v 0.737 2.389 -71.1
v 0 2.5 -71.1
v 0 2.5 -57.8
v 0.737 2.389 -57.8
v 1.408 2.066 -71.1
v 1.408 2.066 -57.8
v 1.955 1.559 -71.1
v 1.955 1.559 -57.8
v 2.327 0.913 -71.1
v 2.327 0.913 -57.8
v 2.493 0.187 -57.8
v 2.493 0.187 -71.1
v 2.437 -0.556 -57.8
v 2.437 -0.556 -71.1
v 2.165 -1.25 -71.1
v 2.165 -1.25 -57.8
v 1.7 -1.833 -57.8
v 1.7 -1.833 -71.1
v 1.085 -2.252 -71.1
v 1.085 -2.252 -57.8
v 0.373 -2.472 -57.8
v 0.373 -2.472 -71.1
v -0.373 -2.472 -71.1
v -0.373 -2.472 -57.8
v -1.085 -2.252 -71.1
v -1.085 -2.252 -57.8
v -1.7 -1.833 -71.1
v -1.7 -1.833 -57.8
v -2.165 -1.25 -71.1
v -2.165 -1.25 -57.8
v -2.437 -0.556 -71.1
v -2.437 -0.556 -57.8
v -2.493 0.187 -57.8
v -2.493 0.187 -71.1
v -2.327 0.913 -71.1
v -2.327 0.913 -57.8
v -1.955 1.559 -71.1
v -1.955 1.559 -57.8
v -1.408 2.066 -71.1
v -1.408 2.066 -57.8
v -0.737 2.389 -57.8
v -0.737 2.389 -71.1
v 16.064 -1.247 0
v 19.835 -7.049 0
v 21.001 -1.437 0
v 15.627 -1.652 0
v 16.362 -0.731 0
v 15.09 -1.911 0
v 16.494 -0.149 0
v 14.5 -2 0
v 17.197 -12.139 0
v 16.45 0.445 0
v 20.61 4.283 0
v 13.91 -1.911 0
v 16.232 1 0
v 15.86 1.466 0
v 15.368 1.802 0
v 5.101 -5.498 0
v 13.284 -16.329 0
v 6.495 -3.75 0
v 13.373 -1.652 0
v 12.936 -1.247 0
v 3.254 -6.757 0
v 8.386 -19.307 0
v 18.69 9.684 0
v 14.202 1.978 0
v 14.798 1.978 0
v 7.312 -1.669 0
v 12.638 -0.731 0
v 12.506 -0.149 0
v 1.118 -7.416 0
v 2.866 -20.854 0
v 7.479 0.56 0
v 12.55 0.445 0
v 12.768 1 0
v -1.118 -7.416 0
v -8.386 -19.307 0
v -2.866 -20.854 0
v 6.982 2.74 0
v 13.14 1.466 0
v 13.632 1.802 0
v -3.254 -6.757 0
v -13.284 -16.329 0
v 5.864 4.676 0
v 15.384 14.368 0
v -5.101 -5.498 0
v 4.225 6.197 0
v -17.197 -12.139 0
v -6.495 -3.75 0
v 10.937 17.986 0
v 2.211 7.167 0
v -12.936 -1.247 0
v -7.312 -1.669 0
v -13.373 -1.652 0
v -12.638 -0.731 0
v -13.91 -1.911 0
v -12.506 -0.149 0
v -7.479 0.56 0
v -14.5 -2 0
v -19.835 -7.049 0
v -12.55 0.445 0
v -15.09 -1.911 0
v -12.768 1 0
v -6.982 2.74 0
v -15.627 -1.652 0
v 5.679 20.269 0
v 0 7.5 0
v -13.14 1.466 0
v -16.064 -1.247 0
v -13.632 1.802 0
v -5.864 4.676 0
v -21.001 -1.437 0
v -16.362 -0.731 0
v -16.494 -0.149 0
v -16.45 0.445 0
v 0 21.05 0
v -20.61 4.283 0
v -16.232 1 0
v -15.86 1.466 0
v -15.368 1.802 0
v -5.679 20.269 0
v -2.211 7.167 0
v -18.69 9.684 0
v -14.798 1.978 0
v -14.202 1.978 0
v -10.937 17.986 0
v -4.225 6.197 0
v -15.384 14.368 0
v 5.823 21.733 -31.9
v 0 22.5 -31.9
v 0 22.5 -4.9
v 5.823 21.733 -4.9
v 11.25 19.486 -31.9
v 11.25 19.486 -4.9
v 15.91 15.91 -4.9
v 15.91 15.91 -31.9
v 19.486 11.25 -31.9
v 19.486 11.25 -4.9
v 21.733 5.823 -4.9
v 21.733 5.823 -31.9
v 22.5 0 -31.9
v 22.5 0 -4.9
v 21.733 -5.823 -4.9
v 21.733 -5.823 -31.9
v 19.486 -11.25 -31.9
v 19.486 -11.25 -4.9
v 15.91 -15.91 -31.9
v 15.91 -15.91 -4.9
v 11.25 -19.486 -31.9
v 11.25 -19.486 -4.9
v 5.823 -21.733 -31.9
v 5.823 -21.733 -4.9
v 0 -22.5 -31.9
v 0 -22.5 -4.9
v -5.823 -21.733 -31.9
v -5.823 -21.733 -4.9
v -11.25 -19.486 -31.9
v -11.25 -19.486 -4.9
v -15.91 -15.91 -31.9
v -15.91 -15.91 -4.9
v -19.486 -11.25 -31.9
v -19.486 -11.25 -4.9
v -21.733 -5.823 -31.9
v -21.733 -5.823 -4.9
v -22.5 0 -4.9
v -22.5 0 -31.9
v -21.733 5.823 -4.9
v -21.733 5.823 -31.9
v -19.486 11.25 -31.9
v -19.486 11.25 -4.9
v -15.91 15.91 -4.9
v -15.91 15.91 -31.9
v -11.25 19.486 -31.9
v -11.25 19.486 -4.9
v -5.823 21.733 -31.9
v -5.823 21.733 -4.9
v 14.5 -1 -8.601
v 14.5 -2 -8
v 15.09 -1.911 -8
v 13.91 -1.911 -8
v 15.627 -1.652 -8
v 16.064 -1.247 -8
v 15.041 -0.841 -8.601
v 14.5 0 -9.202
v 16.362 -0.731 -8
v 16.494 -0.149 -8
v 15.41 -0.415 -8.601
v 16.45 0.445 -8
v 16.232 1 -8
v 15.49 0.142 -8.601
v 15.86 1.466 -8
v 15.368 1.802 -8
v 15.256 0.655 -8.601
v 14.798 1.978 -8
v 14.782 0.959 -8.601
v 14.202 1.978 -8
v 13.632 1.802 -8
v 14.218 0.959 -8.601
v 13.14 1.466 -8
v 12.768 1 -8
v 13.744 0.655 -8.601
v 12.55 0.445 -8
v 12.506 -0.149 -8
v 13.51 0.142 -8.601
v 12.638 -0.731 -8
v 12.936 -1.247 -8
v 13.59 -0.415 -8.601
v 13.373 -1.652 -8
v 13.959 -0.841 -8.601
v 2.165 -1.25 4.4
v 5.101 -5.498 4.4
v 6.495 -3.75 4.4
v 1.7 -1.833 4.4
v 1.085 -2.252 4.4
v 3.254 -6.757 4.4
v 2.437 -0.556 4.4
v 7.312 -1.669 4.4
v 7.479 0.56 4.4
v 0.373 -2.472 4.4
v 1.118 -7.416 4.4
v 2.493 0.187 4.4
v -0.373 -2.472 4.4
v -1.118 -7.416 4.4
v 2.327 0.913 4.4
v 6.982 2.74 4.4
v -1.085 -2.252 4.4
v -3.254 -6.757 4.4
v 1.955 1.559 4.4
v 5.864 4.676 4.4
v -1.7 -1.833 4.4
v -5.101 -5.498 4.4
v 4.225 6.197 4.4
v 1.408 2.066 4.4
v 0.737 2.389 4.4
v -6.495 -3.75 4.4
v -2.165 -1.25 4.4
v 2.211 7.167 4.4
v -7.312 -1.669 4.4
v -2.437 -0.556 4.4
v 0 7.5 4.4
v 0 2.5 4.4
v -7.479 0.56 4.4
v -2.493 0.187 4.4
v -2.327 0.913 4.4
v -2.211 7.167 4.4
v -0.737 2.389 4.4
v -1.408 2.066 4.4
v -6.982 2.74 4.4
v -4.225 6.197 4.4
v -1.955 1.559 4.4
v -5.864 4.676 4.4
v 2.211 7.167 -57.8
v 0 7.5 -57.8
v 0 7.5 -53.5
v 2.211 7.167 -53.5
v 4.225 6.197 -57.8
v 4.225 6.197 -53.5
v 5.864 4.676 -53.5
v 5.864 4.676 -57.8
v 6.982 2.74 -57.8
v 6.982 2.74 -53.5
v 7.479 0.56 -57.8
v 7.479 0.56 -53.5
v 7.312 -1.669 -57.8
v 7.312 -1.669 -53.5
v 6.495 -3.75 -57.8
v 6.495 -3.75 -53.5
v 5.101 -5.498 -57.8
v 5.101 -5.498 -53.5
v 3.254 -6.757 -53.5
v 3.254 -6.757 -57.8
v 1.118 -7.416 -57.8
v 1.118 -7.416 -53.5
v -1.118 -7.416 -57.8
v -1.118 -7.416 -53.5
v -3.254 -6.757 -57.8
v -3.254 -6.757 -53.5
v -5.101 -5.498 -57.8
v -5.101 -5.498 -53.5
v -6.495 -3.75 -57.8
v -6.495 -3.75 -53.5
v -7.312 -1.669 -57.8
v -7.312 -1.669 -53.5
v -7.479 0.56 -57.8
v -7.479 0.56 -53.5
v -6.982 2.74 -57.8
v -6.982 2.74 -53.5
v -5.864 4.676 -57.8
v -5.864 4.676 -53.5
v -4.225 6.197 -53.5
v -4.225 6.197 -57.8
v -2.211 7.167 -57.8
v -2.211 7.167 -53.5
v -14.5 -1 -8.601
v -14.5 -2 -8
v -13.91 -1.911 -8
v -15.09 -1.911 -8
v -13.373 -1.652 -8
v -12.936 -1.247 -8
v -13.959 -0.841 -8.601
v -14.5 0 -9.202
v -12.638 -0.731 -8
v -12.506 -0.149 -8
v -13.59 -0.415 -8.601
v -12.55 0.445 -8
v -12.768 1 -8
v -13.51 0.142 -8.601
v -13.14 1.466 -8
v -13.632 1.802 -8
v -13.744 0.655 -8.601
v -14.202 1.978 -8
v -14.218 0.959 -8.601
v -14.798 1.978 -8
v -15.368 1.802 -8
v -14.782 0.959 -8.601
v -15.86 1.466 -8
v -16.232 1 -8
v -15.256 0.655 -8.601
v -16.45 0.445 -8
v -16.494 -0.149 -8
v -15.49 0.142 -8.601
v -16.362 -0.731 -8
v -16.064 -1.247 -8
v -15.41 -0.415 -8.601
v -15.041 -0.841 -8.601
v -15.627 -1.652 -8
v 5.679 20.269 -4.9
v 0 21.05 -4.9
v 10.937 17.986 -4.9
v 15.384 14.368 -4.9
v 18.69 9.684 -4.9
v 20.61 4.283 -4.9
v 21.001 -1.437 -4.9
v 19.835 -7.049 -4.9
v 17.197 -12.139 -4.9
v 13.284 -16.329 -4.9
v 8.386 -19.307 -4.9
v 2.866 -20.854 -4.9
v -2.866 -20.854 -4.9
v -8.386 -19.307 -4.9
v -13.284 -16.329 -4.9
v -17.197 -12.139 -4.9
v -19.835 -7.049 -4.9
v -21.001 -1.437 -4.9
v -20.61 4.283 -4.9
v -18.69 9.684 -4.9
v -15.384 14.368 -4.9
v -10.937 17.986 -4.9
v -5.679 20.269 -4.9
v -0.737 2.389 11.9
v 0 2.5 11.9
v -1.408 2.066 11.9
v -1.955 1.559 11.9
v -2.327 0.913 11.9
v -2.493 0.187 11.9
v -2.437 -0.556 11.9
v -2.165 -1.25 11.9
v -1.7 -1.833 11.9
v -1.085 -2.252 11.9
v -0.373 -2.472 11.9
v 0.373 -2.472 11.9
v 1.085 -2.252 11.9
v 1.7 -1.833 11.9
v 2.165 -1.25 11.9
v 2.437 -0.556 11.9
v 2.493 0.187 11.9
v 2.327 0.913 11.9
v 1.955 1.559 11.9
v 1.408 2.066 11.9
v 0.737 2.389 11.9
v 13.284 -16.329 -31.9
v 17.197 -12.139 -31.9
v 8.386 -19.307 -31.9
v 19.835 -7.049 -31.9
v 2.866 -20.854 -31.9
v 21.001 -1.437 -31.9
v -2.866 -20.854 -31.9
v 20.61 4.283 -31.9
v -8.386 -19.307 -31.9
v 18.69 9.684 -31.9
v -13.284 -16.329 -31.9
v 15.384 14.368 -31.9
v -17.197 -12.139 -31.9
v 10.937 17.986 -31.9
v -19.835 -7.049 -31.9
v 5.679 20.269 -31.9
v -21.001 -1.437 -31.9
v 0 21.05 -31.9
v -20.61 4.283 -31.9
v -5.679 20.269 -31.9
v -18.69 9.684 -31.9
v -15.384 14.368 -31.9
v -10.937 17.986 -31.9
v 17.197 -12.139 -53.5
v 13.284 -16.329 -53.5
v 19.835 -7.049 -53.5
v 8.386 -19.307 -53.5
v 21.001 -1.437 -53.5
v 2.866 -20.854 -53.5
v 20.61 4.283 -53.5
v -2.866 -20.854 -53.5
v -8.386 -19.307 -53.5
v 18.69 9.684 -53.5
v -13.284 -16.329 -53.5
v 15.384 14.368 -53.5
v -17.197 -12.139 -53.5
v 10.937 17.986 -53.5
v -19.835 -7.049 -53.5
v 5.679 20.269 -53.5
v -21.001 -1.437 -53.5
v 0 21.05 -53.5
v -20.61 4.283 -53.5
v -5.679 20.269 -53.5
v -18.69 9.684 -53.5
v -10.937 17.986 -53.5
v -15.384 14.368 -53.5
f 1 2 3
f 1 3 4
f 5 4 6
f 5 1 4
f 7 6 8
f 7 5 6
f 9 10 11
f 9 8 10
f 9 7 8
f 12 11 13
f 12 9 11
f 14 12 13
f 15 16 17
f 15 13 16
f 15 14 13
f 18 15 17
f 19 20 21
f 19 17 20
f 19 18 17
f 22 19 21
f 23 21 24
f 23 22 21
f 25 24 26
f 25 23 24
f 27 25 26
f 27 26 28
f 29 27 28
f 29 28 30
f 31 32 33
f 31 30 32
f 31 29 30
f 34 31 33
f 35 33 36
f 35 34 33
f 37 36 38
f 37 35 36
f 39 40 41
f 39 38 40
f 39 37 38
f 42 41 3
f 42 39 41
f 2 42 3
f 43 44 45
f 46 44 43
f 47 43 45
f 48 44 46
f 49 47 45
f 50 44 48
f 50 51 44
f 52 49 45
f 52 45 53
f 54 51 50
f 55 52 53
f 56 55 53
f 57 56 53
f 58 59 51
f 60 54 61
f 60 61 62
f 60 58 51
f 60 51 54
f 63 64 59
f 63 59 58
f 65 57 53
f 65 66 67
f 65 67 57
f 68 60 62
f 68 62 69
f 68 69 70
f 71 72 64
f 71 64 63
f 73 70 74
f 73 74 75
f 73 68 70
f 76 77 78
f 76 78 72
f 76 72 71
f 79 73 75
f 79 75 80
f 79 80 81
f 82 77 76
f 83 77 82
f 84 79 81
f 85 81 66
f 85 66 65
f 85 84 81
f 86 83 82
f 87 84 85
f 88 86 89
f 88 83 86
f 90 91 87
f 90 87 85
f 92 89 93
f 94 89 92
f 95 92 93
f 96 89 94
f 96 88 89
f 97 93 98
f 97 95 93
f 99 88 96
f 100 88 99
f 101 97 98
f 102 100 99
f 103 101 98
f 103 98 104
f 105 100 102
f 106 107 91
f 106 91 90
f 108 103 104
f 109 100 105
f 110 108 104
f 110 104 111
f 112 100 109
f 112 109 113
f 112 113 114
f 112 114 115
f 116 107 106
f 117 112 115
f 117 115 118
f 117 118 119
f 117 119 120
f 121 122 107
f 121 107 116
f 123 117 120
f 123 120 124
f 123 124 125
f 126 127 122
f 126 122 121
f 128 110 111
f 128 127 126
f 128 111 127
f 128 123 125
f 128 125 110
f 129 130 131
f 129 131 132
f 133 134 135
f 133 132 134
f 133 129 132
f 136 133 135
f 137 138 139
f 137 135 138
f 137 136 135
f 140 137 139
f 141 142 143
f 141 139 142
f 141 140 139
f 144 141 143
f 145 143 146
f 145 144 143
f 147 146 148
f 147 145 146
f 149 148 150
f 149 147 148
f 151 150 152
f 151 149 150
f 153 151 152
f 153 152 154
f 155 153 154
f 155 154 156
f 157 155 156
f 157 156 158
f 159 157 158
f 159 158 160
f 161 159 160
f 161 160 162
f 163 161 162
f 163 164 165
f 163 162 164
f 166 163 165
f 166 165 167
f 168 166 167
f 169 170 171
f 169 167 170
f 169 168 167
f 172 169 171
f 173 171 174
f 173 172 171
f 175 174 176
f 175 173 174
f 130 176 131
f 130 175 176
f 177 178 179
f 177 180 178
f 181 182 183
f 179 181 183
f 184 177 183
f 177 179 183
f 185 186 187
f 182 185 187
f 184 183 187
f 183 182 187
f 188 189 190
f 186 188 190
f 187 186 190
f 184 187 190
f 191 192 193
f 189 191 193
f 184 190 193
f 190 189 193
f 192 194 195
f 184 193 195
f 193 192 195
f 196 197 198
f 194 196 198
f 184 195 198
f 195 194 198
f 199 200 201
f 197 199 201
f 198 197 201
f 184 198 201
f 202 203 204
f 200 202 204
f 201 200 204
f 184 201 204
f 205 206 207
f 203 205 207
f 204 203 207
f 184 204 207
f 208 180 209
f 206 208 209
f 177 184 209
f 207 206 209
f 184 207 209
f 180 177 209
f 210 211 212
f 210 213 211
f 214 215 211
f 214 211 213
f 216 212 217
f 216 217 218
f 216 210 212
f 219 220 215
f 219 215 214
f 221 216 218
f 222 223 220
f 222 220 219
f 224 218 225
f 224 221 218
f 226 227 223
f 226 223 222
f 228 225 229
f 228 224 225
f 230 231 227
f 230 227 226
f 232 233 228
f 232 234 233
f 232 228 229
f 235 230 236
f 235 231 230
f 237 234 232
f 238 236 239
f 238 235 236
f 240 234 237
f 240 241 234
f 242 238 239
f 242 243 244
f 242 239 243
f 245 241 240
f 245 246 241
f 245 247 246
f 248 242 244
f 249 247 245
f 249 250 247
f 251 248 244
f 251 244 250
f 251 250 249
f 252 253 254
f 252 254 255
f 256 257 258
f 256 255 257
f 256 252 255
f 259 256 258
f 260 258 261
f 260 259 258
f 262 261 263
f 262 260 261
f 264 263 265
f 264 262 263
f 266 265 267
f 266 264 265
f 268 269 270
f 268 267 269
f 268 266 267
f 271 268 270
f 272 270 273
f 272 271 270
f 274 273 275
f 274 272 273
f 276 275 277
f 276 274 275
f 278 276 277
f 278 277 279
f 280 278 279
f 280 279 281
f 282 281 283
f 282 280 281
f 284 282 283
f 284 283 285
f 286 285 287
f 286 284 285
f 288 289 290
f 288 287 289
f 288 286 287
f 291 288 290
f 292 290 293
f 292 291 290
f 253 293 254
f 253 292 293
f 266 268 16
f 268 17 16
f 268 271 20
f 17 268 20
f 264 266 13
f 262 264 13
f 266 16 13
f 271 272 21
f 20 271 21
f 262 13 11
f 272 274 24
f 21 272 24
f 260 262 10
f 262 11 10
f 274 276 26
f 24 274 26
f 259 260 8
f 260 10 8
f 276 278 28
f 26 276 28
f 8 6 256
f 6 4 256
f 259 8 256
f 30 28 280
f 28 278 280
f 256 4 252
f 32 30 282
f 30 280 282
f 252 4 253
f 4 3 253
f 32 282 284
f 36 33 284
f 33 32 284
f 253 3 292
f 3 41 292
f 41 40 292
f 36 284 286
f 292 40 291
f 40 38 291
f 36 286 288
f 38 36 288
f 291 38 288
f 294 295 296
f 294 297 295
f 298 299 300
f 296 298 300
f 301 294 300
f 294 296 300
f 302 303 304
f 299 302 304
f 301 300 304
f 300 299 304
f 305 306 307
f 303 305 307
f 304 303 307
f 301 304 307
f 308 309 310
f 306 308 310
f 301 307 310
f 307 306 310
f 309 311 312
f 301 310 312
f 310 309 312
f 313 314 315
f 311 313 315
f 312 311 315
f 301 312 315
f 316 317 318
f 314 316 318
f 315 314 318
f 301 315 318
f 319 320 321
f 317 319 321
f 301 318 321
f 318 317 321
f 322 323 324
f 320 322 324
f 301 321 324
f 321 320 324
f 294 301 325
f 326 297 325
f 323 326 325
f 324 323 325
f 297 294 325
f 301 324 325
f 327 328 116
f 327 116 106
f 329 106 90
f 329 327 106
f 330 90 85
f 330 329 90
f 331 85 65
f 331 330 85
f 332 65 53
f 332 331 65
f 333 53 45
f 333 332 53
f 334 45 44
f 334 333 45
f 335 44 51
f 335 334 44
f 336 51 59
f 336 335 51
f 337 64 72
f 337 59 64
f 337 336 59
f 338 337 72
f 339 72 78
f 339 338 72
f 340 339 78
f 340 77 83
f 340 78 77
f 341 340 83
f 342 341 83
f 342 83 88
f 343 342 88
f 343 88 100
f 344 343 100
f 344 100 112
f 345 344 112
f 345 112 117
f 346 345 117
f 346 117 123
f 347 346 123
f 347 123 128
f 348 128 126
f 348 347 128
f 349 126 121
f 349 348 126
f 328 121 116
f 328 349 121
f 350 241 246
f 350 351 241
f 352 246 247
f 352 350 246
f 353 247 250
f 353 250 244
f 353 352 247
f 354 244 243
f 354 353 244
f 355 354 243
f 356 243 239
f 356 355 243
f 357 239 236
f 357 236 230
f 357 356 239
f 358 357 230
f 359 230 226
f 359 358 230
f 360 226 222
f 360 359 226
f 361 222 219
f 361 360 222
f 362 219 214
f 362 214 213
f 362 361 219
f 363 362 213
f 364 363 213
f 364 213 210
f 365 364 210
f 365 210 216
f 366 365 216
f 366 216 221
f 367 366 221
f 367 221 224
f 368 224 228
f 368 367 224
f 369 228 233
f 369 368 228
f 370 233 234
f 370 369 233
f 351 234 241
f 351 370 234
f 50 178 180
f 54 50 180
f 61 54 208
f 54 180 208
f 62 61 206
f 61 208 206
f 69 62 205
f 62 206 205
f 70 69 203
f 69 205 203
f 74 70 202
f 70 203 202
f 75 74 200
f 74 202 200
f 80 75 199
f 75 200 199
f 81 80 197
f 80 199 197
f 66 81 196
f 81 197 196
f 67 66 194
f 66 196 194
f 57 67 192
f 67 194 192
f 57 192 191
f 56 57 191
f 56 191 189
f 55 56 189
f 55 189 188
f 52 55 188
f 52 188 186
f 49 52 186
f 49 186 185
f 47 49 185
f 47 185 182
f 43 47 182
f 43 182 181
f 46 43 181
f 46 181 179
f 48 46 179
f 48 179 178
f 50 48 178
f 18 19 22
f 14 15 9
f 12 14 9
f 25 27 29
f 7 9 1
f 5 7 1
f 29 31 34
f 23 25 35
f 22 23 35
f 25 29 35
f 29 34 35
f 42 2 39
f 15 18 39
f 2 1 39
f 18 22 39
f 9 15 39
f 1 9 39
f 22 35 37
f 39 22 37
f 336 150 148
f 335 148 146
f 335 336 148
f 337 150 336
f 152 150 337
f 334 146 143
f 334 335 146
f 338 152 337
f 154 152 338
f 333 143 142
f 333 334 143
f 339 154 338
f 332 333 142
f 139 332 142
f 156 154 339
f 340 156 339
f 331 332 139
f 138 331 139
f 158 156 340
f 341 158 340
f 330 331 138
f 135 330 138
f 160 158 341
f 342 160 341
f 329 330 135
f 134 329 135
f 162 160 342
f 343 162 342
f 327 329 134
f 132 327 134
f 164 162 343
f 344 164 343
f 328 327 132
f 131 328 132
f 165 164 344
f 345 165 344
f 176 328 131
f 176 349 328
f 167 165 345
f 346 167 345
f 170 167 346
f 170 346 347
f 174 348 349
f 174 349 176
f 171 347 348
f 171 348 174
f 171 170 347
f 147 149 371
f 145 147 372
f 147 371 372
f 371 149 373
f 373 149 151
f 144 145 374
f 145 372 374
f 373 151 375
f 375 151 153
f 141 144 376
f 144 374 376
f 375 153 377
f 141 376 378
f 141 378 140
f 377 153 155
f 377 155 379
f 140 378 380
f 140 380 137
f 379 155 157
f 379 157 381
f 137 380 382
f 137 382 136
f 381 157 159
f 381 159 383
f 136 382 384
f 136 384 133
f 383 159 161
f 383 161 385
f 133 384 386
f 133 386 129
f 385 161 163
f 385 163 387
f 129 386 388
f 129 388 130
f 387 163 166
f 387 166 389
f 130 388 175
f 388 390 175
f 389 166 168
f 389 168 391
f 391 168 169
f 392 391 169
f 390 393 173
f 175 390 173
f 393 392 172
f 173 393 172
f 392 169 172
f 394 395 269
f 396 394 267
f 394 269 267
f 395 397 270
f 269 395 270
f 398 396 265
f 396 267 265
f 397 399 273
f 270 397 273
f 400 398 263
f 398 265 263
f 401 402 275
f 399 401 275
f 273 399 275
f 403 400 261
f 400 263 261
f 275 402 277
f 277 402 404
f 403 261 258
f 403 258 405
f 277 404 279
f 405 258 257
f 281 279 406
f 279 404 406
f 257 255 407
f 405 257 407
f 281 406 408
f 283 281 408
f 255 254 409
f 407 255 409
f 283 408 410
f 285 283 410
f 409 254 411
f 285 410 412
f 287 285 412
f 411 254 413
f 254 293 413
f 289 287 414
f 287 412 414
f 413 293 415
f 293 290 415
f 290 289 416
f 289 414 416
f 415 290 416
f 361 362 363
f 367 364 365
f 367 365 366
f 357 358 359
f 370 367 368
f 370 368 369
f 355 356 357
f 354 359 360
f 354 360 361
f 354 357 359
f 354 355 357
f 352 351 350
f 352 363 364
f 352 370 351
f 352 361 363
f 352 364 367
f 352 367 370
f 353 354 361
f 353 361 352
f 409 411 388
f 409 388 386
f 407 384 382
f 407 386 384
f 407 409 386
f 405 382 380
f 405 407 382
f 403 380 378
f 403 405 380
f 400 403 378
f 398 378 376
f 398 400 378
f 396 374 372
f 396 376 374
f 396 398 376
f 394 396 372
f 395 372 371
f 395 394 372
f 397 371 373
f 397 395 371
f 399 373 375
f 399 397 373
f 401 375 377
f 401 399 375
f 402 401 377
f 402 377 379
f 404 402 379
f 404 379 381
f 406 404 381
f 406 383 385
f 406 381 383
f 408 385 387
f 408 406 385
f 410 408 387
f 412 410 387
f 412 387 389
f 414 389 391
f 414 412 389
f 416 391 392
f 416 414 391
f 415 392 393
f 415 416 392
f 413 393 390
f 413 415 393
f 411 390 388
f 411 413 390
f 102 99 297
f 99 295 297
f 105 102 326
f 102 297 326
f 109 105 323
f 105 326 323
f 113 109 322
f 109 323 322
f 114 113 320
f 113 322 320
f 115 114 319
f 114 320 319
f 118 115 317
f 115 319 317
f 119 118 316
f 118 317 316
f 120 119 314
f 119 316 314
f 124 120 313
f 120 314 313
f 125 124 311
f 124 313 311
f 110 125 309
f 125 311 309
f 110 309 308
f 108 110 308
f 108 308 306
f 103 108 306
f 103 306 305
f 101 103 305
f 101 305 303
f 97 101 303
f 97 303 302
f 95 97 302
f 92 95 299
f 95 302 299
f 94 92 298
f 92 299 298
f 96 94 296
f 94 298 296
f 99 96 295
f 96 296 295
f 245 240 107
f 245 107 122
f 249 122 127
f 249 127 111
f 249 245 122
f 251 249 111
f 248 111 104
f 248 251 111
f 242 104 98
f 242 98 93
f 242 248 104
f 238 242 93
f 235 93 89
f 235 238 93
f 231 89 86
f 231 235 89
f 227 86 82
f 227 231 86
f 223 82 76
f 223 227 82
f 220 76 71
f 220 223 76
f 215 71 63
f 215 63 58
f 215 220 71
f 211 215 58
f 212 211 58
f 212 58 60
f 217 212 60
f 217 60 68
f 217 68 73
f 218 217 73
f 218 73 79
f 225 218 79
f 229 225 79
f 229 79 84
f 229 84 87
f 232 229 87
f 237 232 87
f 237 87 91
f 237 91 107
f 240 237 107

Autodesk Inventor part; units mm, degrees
ref_plane "YZ Plane" through (0, 0, 0) normal (1, 0, 0) x (0, 1, 0)
ref_plane "XZ Plane" through (0, 0, 0) normal (0, 1, 0) x (-1, 0, 0)
ref_plane "XY Plane" through (0, 0, 0) normal (0, 0, 1) x (1, 0, 0)
sketch "スケッチ1" plane through (0, 0, 0) normal (1, 0, 0) x (0, 1, 0)
  line L0 (0, 0) -> (21.05, 0)
  line L1 (21.05, 0) -> (21.05, -53.5)
  line L2 (21.05, -53.5) -> (0, -53.5)
  line L3 (0, -53.5) -> (0, 0)
  line L4 (0, -53.5) -> (7.5, -53.5)
  line L5 (7.5, -53.5) -> (7.5, -57.8)
  line L6 (7.5, -57.8) -> (0, -57.8)
  line L7 (0, -57.8) -> (0, -53.5)
  line L8 (0, -57.8) -> (2.5, -57.8)
  line L9 (2.5, -57.8) -> (2.5, -71.1)
  line L10 (2.5, -71.1) -> (0, -71.1)
  line L11 (0, -71.1) -> (0, -57.8)
  line L12 (0, 0) -> (7.5, 0)
  line L13 (7.5, 0) -> (7.5, 4.4)
  line L14 (7.5, 4.4) -> (0, 4.4)
  line L15 (0, 4.4) -> (0, 0)
  line L16 (0, 4.4) -> (2.5, 4.4)
  line L17 (2.5, 4.4) -> (2.5, 11.9)
  line L18 (2.5, 11.9) -> (0, 11.9)
  line L19 (0, 11.9) -> (0, 4.4)
  line L20 (0, -4.9) -> (22.5, -4.9)
  line L21 (22.5, -4.9) -> (22.5, -31.9)
  line L22 (22.5, -31.9) -> (0, -31.9)
  line L23 (0, -31.9) -> (0, -4.9)
  point P0 (1.25, -71.1)
  point P1 (3.75, -53.5)
  point P2 (21.05, -4.9)
  point P3 (21.05, -31.9)
  dimension "d0" = 2.5
  dimension "d1" = 11.9
  dimension "d2" = 4.4
  dimension "d3" = 7.5
  dimension "d4" = 21.05
  dimension "d5" = 22.5
  dimension "d6" = 53.5
  dimension "d8" = 17.6
  dimension "d9" = 4.3
  dimension "d10" = 2.5
  dimension "d11" = 4.9
  dimension "d12" = 27
revolve "回転1" add sketch "スケッチ1" angle 360 about axis through (0, 0, -31.9) along (0, 0, 1)
sketch "スケッチ2" plane through (0, 0, 0) normal (0, 0, 1) x (1, 0, 0)
  circle A0 centre (0, 0) radius 14.5
  point P0 (14.5, 0)
  point P1 (-14.5, 0)
  dimension "d14" = 29
hole "穴1" at (14.5, 0, 0) at (-14.5, 0, 0) direction (0, 0, -1) diameter 4 depth 8 tip angle 118
thread "ねじ1" size "M4x0.7" class "6H" standard "ANSI Metric M Profile" full length
thread "ねじ2" size "M4x0.7" class "6H" standard "ANSI Metric M Profile" full length
properties part number "RZ735" material "ステンレス鋼"
